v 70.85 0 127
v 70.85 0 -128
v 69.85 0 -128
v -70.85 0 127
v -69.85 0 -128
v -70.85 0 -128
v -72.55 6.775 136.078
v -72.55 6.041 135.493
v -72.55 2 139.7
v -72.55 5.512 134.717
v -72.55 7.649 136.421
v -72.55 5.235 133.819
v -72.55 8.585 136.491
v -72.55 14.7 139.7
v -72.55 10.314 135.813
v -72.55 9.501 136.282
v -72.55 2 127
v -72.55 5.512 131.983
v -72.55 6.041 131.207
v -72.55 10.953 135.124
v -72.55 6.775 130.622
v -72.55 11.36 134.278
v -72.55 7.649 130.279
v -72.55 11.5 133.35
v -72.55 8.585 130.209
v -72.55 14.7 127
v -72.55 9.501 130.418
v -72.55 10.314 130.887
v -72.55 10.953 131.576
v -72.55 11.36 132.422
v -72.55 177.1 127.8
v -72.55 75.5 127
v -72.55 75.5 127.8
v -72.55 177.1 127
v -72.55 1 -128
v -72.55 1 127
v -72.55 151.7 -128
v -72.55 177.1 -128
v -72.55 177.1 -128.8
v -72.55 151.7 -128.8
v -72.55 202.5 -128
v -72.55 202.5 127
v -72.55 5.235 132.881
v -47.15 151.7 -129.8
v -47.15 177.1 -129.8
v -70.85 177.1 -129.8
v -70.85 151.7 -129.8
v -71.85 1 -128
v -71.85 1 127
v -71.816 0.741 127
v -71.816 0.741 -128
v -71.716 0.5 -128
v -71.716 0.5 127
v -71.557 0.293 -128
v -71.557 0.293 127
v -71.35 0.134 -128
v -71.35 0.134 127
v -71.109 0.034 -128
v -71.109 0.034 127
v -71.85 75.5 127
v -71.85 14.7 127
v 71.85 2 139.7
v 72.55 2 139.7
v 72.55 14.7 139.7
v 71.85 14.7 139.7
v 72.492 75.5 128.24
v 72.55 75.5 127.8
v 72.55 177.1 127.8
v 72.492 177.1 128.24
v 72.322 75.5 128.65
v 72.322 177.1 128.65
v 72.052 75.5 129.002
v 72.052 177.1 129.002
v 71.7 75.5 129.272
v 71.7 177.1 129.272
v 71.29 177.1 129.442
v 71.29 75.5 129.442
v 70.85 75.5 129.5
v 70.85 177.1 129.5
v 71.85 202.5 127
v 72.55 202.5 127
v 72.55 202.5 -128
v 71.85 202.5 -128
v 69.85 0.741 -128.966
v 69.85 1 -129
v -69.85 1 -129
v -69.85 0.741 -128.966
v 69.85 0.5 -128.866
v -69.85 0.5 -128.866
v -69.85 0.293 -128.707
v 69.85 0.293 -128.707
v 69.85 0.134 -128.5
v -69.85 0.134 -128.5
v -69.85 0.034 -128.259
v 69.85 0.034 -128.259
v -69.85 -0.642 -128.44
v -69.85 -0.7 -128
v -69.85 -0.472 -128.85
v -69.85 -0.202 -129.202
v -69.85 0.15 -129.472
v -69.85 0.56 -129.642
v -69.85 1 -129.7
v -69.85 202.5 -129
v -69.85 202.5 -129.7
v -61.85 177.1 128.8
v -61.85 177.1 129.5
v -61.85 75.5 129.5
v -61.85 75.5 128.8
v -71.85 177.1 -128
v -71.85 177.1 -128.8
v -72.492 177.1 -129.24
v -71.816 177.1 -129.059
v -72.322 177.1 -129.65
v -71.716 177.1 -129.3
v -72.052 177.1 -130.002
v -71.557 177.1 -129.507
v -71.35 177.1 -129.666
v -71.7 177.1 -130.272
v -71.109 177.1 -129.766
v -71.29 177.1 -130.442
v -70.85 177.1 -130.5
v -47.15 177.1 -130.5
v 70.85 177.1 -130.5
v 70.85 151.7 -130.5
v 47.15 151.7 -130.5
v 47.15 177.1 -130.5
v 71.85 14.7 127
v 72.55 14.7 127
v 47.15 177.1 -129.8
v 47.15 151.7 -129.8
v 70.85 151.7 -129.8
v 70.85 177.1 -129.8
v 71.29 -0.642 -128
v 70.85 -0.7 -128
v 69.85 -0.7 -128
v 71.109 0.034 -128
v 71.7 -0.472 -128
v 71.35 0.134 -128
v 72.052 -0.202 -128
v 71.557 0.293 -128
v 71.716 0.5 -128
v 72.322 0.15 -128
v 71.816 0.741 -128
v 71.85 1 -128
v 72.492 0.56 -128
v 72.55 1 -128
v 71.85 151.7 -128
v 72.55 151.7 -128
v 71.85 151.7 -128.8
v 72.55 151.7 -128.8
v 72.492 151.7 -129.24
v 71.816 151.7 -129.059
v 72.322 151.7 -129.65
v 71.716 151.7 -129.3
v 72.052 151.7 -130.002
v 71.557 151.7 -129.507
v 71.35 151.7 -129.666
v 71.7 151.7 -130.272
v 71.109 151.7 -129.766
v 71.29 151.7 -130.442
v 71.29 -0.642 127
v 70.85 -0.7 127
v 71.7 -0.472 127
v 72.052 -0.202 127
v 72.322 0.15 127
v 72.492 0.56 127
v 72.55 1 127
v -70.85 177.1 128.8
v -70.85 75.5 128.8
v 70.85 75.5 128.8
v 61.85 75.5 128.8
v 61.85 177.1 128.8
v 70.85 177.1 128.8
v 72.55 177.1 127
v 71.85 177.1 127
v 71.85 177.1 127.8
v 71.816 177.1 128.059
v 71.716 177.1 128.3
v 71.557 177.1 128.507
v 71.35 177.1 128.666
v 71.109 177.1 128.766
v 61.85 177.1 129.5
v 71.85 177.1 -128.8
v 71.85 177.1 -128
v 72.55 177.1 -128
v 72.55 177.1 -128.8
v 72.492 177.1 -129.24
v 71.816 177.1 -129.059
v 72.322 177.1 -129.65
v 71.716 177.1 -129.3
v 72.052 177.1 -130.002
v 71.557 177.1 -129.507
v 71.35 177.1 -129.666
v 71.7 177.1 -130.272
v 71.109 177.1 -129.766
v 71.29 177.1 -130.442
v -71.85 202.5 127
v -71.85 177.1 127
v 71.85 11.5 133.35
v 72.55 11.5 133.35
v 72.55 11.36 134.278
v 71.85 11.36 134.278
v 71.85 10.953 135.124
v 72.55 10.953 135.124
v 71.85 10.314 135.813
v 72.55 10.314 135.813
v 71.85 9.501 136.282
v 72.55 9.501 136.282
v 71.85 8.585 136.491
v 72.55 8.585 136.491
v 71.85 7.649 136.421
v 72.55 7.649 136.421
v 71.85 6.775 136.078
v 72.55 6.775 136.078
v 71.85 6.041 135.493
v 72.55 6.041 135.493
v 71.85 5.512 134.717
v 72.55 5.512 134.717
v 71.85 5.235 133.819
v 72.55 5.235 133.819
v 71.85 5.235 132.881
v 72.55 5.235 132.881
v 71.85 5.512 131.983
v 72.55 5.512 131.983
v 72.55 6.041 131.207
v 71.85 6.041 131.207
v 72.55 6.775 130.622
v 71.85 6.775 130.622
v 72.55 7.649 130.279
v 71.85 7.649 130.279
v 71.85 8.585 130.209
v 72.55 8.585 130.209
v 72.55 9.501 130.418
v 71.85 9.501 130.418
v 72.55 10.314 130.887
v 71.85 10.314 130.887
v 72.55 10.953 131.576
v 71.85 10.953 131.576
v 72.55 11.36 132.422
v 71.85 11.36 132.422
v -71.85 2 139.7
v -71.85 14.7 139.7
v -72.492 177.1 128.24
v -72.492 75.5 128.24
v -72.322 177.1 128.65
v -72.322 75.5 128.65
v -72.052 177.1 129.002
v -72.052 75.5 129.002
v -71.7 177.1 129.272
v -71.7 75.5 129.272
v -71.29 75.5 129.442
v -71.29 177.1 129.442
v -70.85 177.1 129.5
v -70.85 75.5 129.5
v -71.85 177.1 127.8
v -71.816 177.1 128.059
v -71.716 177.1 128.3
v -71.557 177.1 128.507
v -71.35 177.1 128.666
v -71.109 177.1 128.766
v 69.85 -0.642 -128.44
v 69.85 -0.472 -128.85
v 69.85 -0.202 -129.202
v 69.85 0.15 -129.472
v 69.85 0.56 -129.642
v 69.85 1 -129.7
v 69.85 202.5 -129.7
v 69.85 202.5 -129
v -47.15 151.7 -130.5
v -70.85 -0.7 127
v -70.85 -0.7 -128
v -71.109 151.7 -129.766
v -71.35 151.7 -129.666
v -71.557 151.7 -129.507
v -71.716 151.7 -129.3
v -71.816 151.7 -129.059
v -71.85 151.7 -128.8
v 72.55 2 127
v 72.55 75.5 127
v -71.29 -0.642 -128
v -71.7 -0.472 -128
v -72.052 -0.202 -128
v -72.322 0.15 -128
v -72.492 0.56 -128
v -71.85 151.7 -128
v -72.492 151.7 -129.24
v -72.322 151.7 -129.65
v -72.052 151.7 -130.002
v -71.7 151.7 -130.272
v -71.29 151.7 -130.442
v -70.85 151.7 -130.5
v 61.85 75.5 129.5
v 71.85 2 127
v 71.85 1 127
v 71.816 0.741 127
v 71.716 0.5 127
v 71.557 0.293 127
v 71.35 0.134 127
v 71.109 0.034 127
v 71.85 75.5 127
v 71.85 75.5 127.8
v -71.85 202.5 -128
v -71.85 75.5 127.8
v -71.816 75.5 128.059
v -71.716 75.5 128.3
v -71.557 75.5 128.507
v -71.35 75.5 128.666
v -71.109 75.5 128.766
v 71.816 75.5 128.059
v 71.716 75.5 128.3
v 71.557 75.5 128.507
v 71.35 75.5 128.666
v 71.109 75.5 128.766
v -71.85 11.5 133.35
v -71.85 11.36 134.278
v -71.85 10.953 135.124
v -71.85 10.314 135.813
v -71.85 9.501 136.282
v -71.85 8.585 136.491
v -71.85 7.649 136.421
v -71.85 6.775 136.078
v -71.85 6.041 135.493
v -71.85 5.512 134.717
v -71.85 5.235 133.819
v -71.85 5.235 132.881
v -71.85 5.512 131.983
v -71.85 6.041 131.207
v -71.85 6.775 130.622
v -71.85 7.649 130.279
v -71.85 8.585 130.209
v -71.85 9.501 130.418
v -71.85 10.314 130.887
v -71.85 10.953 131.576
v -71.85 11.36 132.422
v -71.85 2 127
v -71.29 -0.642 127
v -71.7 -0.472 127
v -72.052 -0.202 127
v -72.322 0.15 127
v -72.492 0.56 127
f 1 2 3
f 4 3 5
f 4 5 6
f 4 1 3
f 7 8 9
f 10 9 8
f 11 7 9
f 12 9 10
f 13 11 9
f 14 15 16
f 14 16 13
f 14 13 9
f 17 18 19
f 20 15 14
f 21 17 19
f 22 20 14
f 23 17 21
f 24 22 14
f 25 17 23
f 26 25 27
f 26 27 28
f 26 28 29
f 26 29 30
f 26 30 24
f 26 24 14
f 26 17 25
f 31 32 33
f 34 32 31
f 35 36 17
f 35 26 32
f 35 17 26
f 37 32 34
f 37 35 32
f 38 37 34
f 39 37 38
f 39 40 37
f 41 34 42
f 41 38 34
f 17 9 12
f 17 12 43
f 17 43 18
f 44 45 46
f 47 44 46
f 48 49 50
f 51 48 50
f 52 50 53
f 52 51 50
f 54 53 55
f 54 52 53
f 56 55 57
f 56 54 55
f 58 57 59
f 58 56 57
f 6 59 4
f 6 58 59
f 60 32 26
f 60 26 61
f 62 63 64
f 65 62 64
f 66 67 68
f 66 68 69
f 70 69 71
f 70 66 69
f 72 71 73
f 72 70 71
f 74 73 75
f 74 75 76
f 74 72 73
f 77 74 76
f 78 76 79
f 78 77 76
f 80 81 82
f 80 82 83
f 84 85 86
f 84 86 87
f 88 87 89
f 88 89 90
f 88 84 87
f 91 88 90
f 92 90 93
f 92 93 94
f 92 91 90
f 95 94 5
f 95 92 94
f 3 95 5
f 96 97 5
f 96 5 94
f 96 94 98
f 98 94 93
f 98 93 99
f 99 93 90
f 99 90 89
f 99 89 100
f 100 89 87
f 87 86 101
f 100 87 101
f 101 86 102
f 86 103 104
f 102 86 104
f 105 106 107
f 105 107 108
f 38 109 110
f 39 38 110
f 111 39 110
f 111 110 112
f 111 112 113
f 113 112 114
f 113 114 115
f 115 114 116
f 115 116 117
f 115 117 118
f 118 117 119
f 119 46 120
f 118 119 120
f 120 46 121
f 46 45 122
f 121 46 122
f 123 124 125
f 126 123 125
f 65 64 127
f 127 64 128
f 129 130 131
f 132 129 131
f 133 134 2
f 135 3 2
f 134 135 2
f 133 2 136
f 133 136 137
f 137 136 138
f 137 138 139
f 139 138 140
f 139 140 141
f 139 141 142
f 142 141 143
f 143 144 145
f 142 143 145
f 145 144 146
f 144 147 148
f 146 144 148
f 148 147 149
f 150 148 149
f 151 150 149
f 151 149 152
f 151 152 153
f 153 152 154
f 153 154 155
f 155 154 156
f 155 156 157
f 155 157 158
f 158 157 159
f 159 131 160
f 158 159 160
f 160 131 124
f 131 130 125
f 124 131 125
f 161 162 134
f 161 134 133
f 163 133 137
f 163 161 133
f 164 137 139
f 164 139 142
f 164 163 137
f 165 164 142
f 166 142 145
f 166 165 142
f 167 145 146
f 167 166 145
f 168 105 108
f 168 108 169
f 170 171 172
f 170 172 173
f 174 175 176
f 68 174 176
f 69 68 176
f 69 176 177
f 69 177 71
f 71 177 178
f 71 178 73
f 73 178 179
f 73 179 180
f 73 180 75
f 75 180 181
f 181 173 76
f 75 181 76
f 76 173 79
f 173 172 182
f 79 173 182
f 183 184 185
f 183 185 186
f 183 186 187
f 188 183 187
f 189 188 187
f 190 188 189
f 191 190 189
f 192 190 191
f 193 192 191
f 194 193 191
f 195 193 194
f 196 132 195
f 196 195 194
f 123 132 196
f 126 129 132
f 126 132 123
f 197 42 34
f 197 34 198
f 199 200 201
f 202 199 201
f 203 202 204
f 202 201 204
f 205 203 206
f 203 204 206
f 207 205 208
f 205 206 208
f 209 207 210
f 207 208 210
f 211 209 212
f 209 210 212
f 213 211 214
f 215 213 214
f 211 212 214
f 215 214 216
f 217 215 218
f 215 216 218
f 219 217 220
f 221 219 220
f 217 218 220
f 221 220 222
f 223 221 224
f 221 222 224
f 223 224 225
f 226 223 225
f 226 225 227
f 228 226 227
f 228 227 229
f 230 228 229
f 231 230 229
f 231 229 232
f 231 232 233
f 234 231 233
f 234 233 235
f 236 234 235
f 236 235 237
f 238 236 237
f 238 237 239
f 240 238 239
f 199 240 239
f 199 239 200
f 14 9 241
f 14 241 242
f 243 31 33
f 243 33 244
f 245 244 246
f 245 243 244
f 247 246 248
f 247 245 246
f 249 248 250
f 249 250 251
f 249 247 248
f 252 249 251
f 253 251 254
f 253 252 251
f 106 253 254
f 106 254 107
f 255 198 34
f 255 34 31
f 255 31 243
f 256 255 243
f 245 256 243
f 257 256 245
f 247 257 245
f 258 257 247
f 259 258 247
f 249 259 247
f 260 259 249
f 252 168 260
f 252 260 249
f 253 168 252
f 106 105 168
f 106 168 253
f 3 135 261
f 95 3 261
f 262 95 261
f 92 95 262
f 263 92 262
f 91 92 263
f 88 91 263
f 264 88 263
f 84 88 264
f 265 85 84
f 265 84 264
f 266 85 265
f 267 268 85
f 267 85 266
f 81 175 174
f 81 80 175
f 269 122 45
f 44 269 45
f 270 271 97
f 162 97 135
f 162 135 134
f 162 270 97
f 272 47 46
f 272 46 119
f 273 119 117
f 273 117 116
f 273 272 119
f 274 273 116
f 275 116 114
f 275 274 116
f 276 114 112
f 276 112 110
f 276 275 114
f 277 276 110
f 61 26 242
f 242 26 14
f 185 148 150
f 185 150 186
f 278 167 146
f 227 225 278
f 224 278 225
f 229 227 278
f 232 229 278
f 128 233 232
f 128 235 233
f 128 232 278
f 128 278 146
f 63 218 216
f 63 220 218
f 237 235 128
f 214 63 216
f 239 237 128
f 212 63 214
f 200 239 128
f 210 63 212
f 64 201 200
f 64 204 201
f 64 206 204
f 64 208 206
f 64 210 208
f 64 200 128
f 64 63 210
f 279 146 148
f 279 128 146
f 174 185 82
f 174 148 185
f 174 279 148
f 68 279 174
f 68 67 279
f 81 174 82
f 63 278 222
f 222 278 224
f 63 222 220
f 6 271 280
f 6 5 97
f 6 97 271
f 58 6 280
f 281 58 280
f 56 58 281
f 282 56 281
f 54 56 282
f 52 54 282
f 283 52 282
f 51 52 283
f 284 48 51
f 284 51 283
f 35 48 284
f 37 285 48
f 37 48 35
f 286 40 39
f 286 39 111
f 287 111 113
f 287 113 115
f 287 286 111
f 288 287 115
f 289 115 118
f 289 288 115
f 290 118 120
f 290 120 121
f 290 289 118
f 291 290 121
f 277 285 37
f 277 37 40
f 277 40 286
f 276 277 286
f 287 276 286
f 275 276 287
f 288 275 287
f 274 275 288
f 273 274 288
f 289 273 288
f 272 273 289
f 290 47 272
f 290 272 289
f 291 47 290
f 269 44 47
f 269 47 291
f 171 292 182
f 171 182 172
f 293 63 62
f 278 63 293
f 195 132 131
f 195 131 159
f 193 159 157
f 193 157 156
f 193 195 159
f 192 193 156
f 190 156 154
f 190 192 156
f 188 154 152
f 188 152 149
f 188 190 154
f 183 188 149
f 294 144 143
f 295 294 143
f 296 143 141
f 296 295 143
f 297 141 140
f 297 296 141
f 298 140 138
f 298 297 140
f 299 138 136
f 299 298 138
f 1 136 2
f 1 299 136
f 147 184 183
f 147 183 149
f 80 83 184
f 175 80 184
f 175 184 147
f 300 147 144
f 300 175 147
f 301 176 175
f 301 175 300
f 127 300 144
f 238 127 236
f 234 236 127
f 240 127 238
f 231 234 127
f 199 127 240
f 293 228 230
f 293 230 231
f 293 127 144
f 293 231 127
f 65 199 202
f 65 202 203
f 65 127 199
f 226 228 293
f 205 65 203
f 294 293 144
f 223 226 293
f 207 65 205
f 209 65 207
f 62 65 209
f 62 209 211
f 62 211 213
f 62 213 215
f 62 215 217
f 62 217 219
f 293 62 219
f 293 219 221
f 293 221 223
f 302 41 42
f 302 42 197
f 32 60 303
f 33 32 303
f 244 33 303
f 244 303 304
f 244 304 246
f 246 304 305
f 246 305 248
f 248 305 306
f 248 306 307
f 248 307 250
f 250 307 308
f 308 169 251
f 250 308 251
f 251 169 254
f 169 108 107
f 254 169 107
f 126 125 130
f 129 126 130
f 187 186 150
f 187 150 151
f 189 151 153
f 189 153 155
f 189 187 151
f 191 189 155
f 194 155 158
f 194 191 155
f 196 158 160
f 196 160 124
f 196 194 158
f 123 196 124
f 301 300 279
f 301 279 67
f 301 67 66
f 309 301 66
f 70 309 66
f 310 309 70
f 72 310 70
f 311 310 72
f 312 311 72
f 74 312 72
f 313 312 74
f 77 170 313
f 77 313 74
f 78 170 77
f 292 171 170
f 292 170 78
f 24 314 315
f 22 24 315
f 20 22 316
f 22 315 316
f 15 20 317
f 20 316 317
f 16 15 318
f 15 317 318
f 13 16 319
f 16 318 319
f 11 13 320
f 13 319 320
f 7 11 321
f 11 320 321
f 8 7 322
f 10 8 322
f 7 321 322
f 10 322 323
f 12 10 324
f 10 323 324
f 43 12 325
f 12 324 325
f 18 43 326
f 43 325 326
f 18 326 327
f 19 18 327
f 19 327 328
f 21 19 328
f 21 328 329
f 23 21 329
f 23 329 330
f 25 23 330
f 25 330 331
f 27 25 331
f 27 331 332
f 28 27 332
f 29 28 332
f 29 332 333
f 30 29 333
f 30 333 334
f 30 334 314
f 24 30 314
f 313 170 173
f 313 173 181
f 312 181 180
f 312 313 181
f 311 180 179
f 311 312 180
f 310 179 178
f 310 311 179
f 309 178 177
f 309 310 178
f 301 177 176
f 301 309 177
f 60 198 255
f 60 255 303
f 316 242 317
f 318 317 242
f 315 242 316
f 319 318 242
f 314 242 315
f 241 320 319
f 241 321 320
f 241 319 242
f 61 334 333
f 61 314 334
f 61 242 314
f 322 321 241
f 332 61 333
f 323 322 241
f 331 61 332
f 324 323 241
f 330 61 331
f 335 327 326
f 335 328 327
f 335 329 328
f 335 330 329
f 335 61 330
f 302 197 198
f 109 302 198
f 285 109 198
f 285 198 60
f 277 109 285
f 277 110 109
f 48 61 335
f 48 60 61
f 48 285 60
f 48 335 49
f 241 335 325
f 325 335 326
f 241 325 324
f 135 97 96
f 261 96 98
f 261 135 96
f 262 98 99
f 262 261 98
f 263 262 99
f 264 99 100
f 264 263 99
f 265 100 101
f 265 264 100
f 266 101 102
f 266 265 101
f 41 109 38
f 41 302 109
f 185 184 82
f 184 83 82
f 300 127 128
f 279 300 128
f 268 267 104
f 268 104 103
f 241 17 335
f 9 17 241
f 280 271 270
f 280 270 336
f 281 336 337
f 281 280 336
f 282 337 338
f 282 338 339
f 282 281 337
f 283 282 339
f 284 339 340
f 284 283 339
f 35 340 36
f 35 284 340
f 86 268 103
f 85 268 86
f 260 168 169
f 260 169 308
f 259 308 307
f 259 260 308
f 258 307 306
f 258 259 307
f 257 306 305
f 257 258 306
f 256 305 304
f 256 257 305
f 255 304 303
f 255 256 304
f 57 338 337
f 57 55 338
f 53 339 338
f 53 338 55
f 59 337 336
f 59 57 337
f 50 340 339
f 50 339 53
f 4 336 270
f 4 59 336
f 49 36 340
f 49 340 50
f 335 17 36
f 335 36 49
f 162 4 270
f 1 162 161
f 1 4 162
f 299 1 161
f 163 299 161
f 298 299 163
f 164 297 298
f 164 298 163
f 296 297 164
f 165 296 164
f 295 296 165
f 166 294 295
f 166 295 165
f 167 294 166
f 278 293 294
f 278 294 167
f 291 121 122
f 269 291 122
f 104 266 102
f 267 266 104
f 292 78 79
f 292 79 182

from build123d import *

# Parameters (mm, degrees)
SKETCH2_W           = 139.7
SKETCH2_H           = 254
BASE_FLANGE1_DEPTH  = 0.7
EDGE_FLANGE4_DEPTH  = 139.7
EDGE_FLANGE5_DEPTH  = 255
EDGE_FLANGE6_DEPTH  = 255
EDGE_FLANGE7_DEPTH  = 25.4
EDGE_FLANGE9_DEPTH  = 25.4
EDGE_FLANGE10_DEPTH = 101.6
EDGE_FLANGE11_DEPTH = 101.6
SKETCH76_W          = 12.7
SKETCH76_H          = 12.7
TAB1_DEPTH          = 0.7
SKETCH79_W          = 12.7
SKETCH79_H          = 12.7
TAB2_DEPTH          = 0.7
SKETCH86_R          = 3.15
CUT_EXTRUDE3_DEPTH  = 286.615738362


# Sheet-metal steps are written as plain solids
with BuildPart() as part:
    # Sketch2 → Base-Flange1 (new body)
    with BuildSketch(Plane(origin=(0, 0, 0), x_dir=(1, 0, 0), z_dir=(0, 1, 0))):
        Rectangle(SKETCH2_W, SKETCH2_H)
    extrude(amount=-BASE_FLANGE1_DEPTH)

    # Edge-Flange4 section (across the edge) → Edge-Flange4 (add)
    with BuildSketch(Plane(origin=(69.85, 0, -129), x_dir=(0, 0, 1), z_dir=(-1, 0, 0))):
        with BuildLine():
            Line((-0.7, 1), (-0.7, 202.5))
            Line((-0.7, 202.5), (0, 202.5))
            Line((0, 202.5), (0, 1))
            ThreePointArc((0, 1), (0.292893219, 0.292893219), (1, 0))
            Line((1, 0), (2, 0))
            Line((2, 0), (2, -0.7))
            Line((2, -0.7), (1, -0.7))
            ThreePointArc((1, -0.7), (-0.202081528, -0.202081528), (-0.7, 1))
        make_face()
    extrude(amount=EDGE_FLANGE4_DEPTH)

    # Edge-Flange5 section (across the edge) → Edge-Flange5 (add)
    with BuildSketch(Plane(origin=(-71.85, 0, -128), x_dir=(1, 0, 0), z_dir=(0, 0, 1))):
        with BuildLine():
            Line((-0.7, 1), (-0.7, 202.5))
            Line((-0.7, 202.5), (0, 202.5))
            Line((0, 202.5), (0, 1))
            ThreePointArc((0, 1), (0.292893219, 0.292893219), (1, 0))
            Line((1, 0), (2, 0))
            Line((2, 0), (2, -0.7))
            Line((2, -0.7), (1, -0.7))
            ThreePointArc((1, -0.7), (-0.202081528, -0.202081528), (-0.7, 1))
        make_face()
    extrude(amount=EDGE_FLANGE5_DEPTH)

    # Edge-Flange6 section (across the edge) → Edge-Flange6 (add)
    with BuildSketch(Plane(origin=(71.85, 0, 127), x_dir=(-1, 0, 0), z_dir=(0, 0, -1))):
        with BuildLine():
            Line((-0.7, 1), (-0.7, 202.5))
            Line((-0.7, 202.5), (0, 202.5))
            Line((0, 202.5), (0, 1))
            ThreePointArc((0, 1), (0.292893219, 0.292893219), (1, 0))
            Line((1, 0), (2, 0))
            Line((2, 0), (2, -0.7))
            Line((2, -0.7), (1, -0.7))
            ThreePointArc((1, -0.7), (-0.202081528, -0.202081528), (-0.7, 1))
        make_face()
    extrude(amount=EDGE_FLANGE6_DEPTH)

    # Edge-Flange7 section (across the edge) → Edge-Flange7 (add)
    with BuildSketch(Plane(origin=(-71.85, 151.7, -129.8), x_dir=(0, 0, 1), z_dir=(0, 1, 0))):
        with BuildLine():
            Line((-0.7, 1), (-0.7, 24.7))
            Line((-0.7, 24.7), (0, 24.7))
            Line((0, 24.7), (0, 1))
            ThreePointArc((0, 1), (0.292893219, 0.292893219), (1, 0))
            Line((1, 0), (1.8, 0))
            Line((1.8, 0), (1.8, -0.7))
            Line((1.8, -0.7), (1, -0.7))
            ThreePointArc((1, -0.7), (-0.202081528, -0.202081528), (-0.7, 1))
        make_face()
    extrude(amount=EDGE_FLANGE7_DEPTH)

    # Edge-Flange9 section (across the edge) → Edge-Flange9 (add)
    with BuildSketch(Plane(origin=(71.85, 177.1, -129.8), x_dir=(0, 0, 1), z_dir=(0, -1, 0))):
        with BuildLine():
            Line((-0.7, 1), (-0.7, 24.7))
            Line((-0.7, 24.7), (0, 24.7))
            Line((0, 24.7), (0, 1))
            ThreePointArc((0, 1), (0.292893219, 0.292893219), (1, 0))
            Line((1, 0), (1.8, 0))
            Line((1.8, 0), (1.8, -0.7))
            Line((1.8, -0.7), (1, -0.7))
            ThreePointArc((1, -0.7), (-0.202081528, -0.202081528), (-0.7, 1))
        make_face()
    extrude(amount=EDGE_FLANGE9_DEPTH)

    # Edge-Flange10 section (across the edge) → Edge-Flange10 (add)
    with BuildSketch(Plane(origin=(71.85, 75.5, 128.8), x_dir=(0, 0, -1), z_dir=(0, 1, 0))):
        with BuildLine():
            Line((-0.7, 1), (-0.7, 10))
            Line((-0.7, 10), (0, 10))
            Line((0, 10), (0, 1))
            ThreePointArc((0, 1), (0.292893219, 0.292893219), (1, 0))
            Line((1, 0), (1.8, 0))
            Line((1.8, 0), (1.8, -0.7))
            Line((1.8, -0.7), (1, -0.7))
            ThreePointArc((1, -0.7), (-0.202081528, -0.202081528), (-0.7, 1))
        make_face()
    extrude(amount=EDGE_FLANGE10_DEPTH)

    # Edge-Flange11 section (across the edge) → Edge-Flange11 (add)
    with BuildSketch(Plane(origin=(-71.85, 177.1, 128.8), x_dir=(0, 0, -1), z_dir=(0, -1, 0))):
        with BuildLine():
            Line((-0.7, 1), (-0.7, 10))
            Line((-0.7, 10), (0, 10))
            Line((0, 10), (0, 1))
            ThreePointArc((0, 1), (0.292893219, 0.292893219), (1, 0))
            Line((1, 0), (1.8, 0))
            Line((1.8, 0), (1.8, -0.7))
            Line((1.8, -0.7), (1, -0.7))
            ThreePointArc((1, -0.7), (-0.202081528, -0.202081528), (-0.7, 1))
        make_face()
    extrude(amount=EDGE_FLANGE11_DEPTH)

    # Sketch76 → Tab1 (add)
    with BuildSketch(Plane.ZY.offset(72.55)):
        with Locations((133.35, 8.35)):
            Rectangle(SKETCH76_W, SKETCH76_H)
    extrude(amount=-TAB1_DEPTH)

    # Sketch79 → Tab2 (add)
    with BuildSketch(Plane(origin=(72.55, 0, 0), x_dir=(0, 0, -1), z_dir=(1, 0, 0))):
        with Locations((-133.35, 8.35)):
            Rectangle(SKETCH79_W, SKETCH79_H)
    extrude(amount=-TAB2_DEPTH)

    # Sketch86 → Cut-Extrude3 (cut, through all)
    with BuildSketch(Plane(origin=(72.55, 0, 0), x_dir=(0, 0, -1), z_dir=(1, 0, 0))):
        with Locations(Location((-133.35, 8.35, 0), (0, 0, 90))):
            Circle(SKETCH86_R)
    extrude(amount=-CUT_EXTRUDE3_DEPTH, mode=Mode.SUBTRACT)


solid = part.part
